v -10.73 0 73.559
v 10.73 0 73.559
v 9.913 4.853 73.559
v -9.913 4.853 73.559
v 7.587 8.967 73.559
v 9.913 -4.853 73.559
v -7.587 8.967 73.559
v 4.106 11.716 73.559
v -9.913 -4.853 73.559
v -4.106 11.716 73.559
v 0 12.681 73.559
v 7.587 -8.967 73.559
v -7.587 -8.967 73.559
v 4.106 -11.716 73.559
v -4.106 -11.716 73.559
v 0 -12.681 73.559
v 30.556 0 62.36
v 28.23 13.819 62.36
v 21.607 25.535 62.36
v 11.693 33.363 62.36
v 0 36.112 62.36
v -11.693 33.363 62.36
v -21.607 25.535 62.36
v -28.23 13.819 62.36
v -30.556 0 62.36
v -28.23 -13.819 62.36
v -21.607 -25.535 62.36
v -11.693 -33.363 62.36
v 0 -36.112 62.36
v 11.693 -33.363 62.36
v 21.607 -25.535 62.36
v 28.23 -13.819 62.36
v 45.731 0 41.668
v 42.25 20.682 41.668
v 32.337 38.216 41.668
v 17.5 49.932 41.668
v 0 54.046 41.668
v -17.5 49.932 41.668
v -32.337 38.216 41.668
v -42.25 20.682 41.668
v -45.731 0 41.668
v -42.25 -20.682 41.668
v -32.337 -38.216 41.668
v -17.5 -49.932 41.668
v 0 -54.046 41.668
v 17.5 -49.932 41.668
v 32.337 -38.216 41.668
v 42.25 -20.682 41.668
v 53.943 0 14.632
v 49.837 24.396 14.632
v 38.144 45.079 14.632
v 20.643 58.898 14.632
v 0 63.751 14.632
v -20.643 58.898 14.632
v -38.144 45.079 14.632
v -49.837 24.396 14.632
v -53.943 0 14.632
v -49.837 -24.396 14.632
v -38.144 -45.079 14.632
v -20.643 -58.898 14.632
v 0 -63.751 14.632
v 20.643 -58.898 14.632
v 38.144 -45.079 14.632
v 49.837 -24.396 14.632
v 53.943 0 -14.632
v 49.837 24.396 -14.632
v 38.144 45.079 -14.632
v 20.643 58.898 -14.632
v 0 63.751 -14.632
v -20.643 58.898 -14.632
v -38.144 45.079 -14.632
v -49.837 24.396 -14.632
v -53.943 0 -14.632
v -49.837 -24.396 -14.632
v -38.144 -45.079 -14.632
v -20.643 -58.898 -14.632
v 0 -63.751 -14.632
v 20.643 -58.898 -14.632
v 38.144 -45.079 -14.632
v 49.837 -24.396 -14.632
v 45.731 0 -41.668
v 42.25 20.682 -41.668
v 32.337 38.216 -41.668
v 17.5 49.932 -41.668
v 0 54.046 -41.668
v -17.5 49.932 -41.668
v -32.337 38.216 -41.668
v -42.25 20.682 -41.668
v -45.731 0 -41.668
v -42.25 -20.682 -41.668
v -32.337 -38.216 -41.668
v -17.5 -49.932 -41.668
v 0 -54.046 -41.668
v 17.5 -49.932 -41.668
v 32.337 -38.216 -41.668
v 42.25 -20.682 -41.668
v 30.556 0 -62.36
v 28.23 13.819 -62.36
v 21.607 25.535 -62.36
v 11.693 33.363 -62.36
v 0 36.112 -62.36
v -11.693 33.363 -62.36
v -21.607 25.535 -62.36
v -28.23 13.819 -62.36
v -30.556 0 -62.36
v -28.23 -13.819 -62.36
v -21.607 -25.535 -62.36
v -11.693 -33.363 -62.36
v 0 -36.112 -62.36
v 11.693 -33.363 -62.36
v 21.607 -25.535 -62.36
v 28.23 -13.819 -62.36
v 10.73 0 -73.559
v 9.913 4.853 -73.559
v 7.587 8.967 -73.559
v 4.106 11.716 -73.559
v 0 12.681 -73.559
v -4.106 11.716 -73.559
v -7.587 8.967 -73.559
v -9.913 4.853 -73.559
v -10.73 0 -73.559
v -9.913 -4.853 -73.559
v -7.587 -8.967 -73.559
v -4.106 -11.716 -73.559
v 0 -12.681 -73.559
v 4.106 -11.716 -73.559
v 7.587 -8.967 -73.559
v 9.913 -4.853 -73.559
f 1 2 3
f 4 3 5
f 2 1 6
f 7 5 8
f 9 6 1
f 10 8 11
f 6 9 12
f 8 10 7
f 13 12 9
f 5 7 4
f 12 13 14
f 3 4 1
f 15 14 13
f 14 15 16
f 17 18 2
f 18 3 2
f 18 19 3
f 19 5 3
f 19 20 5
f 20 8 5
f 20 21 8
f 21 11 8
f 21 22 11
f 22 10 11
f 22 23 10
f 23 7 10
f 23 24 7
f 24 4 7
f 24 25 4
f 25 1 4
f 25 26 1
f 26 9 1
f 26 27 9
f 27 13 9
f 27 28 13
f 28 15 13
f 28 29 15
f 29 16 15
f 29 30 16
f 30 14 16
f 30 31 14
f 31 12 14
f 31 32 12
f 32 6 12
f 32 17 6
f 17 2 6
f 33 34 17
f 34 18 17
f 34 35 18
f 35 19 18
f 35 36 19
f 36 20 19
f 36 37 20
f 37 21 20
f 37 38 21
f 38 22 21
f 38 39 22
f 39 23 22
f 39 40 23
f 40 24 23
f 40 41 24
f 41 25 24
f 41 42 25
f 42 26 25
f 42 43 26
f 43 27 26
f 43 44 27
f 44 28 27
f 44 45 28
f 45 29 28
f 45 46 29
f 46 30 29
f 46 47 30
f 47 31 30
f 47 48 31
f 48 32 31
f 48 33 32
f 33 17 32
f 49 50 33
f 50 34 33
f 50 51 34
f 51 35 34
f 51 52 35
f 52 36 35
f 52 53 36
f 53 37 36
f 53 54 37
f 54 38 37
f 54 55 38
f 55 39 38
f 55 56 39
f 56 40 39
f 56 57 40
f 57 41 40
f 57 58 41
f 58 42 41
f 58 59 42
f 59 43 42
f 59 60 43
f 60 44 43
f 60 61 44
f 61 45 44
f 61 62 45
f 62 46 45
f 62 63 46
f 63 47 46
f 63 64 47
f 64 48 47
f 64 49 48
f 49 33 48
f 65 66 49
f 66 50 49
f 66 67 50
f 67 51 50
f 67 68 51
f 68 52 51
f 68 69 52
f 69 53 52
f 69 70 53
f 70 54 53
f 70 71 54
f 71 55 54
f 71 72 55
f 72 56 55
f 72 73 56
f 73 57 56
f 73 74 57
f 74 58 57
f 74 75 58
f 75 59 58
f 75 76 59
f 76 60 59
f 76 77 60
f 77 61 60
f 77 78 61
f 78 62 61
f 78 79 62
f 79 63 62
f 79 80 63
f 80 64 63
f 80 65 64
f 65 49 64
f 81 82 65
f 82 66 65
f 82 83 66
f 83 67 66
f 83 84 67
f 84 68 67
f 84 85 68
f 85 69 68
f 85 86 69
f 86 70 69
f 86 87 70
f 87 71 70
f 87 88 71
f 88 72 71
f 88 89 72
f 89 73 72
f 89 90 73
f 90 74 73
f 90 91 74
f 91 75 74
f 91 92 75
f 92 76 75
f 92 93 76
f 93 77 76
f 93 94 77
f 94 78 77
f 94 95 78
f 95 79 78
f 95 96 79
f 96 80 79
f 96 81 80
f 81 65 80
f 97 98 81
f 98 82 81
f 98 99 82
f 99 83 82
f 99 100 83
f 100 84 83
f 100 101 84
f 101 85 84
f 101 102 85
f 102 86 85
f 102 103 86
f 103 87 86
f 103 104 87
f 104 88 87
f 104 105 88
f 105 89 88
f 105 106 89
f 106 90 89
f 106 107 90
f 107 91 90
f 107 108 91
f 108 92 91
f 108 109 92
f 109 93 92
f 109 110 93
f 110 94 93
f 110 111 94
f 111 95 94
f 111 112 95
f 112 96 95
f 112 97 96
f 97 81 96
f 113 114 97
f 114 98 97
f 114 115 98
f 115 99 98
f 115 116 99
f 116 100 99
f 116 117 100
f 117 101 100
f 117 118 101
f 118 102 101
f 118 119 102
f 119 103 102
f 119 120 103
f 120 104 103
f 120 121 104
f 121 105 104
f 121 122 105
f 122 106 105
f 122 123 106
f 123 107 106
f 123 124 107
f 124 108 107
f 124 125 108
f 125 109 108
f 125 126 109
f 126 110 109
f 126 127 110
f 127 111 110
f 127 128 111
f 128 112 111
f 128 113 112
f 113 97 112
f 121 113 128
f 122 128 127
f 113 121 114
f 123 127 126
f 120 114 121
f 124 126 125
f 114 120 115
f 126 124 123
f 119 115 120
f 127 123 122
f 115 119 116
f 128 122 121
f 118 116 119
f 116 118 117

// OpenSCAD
// Generated by SolidPython 1.0.1 on 2020-07-29 00:46:49


scale(v = [11, 13, 15]) {
	sphere(r = 5);
}
/***********************************************
*********      SolidPython code:      **********
************************************************
 
# import packages: SolidPython
from solid import *
from solid.utils import *
from itertools import chain, combinations, permutations


class Resize:

    def __init__(self, scad_file):
        self.scad_file = scad_file
        #self.scad_file = import_scad(scad_file)
        # cone/cylinder param:
        self.r1 = 0
        self.r2 = 0
        self.h = 0
        # rectangular prism param:
        self.w = 0
        self.l = 0
        # ellipse param:
        self.r = 0

    # import OpenScad code (file name corresponds to shape)


    # classify shape + parameters
    def assign(self, param1, param2, param3):
        if self.scad_file == 'cone.scad':
            self.r1 = param1
            self.r2 = param2
            self.h = param3
        elif self.scad_file == 'cylinder.scad':
            self.r1 = param1
            self.r2 = param2
            self.h = param3
        elif self.scad_file == 'rectangularPrism.scad':
            self.h = param1
            self.l = param2
            self.w = param3
        else:
            self.r = param1
            self.h = param2

    # resize parameters
    def iterate(self):
        x = range(3, 20, 2)
        i = 1
        if self.scad_file == 'cone.scad':
            tempList = list(permutations(x, 2))
            for temp in tempList:
                param1 = temp[0]
                param2 = temp[1]
                filepath = 'produced_scad_files/' + 'cone' + str(param1) + '_' + str(param2) + '_' + '.scad'
                scad_render_to_file(cylinder(h=param1, r1=param2, r2=0), filepath)

        elif self.scad_file == 'cylinder.scad':
            tempList = list(permutations(x, 3))
            for temp in tempList:
                param1 = temp[0]
                param2 = temp[1]
                filepath = 'produced_scad_files/' + 'cylinder' + str(param1) + '_' + str(param2) + '_' + '.scad'
                scad_render_to_file(cylinder(h=param1, r1=param2, r2=param2), filepath)

        elif self.scad_file == 'rectangularPrism.scad':
            tempList = list(permutations(x, 3))
            for temp in tempList:
                param1 = temp[0]
                param2 = temp[1]
                param3 = temp[2]
                filepath = 'produced_scad_files/' + 'rectangularPrism' + str(param1) + '_' + str(param2) + '_' + str(
                    param3) + '.scad'
                scad_render_to_file(cube(size=(param1, param2, param3)), filepath)

        elif self.scad_file == 'ellipse.scad':
            tempList = list(permutations(x, 4))
            for temp in tempList:
                param1 = temp[0]
                param2 = temp[1]
                param3 = temp[2]
                param4 = temp[3]
                filepath = 'produced_scad_files/' + 'ellipse' + str(param1) + '_' + str(param2) + '_' + str(param3) + '_' + str(param4) + '.scad'
                scad_render_to_file(scale([param1, param2, param3])(sphere(r=param4)), filepath)

    def render_to_scadfile(self):
        scad_render_to_file(scad, 'example.scad') 
 
************************************************/
